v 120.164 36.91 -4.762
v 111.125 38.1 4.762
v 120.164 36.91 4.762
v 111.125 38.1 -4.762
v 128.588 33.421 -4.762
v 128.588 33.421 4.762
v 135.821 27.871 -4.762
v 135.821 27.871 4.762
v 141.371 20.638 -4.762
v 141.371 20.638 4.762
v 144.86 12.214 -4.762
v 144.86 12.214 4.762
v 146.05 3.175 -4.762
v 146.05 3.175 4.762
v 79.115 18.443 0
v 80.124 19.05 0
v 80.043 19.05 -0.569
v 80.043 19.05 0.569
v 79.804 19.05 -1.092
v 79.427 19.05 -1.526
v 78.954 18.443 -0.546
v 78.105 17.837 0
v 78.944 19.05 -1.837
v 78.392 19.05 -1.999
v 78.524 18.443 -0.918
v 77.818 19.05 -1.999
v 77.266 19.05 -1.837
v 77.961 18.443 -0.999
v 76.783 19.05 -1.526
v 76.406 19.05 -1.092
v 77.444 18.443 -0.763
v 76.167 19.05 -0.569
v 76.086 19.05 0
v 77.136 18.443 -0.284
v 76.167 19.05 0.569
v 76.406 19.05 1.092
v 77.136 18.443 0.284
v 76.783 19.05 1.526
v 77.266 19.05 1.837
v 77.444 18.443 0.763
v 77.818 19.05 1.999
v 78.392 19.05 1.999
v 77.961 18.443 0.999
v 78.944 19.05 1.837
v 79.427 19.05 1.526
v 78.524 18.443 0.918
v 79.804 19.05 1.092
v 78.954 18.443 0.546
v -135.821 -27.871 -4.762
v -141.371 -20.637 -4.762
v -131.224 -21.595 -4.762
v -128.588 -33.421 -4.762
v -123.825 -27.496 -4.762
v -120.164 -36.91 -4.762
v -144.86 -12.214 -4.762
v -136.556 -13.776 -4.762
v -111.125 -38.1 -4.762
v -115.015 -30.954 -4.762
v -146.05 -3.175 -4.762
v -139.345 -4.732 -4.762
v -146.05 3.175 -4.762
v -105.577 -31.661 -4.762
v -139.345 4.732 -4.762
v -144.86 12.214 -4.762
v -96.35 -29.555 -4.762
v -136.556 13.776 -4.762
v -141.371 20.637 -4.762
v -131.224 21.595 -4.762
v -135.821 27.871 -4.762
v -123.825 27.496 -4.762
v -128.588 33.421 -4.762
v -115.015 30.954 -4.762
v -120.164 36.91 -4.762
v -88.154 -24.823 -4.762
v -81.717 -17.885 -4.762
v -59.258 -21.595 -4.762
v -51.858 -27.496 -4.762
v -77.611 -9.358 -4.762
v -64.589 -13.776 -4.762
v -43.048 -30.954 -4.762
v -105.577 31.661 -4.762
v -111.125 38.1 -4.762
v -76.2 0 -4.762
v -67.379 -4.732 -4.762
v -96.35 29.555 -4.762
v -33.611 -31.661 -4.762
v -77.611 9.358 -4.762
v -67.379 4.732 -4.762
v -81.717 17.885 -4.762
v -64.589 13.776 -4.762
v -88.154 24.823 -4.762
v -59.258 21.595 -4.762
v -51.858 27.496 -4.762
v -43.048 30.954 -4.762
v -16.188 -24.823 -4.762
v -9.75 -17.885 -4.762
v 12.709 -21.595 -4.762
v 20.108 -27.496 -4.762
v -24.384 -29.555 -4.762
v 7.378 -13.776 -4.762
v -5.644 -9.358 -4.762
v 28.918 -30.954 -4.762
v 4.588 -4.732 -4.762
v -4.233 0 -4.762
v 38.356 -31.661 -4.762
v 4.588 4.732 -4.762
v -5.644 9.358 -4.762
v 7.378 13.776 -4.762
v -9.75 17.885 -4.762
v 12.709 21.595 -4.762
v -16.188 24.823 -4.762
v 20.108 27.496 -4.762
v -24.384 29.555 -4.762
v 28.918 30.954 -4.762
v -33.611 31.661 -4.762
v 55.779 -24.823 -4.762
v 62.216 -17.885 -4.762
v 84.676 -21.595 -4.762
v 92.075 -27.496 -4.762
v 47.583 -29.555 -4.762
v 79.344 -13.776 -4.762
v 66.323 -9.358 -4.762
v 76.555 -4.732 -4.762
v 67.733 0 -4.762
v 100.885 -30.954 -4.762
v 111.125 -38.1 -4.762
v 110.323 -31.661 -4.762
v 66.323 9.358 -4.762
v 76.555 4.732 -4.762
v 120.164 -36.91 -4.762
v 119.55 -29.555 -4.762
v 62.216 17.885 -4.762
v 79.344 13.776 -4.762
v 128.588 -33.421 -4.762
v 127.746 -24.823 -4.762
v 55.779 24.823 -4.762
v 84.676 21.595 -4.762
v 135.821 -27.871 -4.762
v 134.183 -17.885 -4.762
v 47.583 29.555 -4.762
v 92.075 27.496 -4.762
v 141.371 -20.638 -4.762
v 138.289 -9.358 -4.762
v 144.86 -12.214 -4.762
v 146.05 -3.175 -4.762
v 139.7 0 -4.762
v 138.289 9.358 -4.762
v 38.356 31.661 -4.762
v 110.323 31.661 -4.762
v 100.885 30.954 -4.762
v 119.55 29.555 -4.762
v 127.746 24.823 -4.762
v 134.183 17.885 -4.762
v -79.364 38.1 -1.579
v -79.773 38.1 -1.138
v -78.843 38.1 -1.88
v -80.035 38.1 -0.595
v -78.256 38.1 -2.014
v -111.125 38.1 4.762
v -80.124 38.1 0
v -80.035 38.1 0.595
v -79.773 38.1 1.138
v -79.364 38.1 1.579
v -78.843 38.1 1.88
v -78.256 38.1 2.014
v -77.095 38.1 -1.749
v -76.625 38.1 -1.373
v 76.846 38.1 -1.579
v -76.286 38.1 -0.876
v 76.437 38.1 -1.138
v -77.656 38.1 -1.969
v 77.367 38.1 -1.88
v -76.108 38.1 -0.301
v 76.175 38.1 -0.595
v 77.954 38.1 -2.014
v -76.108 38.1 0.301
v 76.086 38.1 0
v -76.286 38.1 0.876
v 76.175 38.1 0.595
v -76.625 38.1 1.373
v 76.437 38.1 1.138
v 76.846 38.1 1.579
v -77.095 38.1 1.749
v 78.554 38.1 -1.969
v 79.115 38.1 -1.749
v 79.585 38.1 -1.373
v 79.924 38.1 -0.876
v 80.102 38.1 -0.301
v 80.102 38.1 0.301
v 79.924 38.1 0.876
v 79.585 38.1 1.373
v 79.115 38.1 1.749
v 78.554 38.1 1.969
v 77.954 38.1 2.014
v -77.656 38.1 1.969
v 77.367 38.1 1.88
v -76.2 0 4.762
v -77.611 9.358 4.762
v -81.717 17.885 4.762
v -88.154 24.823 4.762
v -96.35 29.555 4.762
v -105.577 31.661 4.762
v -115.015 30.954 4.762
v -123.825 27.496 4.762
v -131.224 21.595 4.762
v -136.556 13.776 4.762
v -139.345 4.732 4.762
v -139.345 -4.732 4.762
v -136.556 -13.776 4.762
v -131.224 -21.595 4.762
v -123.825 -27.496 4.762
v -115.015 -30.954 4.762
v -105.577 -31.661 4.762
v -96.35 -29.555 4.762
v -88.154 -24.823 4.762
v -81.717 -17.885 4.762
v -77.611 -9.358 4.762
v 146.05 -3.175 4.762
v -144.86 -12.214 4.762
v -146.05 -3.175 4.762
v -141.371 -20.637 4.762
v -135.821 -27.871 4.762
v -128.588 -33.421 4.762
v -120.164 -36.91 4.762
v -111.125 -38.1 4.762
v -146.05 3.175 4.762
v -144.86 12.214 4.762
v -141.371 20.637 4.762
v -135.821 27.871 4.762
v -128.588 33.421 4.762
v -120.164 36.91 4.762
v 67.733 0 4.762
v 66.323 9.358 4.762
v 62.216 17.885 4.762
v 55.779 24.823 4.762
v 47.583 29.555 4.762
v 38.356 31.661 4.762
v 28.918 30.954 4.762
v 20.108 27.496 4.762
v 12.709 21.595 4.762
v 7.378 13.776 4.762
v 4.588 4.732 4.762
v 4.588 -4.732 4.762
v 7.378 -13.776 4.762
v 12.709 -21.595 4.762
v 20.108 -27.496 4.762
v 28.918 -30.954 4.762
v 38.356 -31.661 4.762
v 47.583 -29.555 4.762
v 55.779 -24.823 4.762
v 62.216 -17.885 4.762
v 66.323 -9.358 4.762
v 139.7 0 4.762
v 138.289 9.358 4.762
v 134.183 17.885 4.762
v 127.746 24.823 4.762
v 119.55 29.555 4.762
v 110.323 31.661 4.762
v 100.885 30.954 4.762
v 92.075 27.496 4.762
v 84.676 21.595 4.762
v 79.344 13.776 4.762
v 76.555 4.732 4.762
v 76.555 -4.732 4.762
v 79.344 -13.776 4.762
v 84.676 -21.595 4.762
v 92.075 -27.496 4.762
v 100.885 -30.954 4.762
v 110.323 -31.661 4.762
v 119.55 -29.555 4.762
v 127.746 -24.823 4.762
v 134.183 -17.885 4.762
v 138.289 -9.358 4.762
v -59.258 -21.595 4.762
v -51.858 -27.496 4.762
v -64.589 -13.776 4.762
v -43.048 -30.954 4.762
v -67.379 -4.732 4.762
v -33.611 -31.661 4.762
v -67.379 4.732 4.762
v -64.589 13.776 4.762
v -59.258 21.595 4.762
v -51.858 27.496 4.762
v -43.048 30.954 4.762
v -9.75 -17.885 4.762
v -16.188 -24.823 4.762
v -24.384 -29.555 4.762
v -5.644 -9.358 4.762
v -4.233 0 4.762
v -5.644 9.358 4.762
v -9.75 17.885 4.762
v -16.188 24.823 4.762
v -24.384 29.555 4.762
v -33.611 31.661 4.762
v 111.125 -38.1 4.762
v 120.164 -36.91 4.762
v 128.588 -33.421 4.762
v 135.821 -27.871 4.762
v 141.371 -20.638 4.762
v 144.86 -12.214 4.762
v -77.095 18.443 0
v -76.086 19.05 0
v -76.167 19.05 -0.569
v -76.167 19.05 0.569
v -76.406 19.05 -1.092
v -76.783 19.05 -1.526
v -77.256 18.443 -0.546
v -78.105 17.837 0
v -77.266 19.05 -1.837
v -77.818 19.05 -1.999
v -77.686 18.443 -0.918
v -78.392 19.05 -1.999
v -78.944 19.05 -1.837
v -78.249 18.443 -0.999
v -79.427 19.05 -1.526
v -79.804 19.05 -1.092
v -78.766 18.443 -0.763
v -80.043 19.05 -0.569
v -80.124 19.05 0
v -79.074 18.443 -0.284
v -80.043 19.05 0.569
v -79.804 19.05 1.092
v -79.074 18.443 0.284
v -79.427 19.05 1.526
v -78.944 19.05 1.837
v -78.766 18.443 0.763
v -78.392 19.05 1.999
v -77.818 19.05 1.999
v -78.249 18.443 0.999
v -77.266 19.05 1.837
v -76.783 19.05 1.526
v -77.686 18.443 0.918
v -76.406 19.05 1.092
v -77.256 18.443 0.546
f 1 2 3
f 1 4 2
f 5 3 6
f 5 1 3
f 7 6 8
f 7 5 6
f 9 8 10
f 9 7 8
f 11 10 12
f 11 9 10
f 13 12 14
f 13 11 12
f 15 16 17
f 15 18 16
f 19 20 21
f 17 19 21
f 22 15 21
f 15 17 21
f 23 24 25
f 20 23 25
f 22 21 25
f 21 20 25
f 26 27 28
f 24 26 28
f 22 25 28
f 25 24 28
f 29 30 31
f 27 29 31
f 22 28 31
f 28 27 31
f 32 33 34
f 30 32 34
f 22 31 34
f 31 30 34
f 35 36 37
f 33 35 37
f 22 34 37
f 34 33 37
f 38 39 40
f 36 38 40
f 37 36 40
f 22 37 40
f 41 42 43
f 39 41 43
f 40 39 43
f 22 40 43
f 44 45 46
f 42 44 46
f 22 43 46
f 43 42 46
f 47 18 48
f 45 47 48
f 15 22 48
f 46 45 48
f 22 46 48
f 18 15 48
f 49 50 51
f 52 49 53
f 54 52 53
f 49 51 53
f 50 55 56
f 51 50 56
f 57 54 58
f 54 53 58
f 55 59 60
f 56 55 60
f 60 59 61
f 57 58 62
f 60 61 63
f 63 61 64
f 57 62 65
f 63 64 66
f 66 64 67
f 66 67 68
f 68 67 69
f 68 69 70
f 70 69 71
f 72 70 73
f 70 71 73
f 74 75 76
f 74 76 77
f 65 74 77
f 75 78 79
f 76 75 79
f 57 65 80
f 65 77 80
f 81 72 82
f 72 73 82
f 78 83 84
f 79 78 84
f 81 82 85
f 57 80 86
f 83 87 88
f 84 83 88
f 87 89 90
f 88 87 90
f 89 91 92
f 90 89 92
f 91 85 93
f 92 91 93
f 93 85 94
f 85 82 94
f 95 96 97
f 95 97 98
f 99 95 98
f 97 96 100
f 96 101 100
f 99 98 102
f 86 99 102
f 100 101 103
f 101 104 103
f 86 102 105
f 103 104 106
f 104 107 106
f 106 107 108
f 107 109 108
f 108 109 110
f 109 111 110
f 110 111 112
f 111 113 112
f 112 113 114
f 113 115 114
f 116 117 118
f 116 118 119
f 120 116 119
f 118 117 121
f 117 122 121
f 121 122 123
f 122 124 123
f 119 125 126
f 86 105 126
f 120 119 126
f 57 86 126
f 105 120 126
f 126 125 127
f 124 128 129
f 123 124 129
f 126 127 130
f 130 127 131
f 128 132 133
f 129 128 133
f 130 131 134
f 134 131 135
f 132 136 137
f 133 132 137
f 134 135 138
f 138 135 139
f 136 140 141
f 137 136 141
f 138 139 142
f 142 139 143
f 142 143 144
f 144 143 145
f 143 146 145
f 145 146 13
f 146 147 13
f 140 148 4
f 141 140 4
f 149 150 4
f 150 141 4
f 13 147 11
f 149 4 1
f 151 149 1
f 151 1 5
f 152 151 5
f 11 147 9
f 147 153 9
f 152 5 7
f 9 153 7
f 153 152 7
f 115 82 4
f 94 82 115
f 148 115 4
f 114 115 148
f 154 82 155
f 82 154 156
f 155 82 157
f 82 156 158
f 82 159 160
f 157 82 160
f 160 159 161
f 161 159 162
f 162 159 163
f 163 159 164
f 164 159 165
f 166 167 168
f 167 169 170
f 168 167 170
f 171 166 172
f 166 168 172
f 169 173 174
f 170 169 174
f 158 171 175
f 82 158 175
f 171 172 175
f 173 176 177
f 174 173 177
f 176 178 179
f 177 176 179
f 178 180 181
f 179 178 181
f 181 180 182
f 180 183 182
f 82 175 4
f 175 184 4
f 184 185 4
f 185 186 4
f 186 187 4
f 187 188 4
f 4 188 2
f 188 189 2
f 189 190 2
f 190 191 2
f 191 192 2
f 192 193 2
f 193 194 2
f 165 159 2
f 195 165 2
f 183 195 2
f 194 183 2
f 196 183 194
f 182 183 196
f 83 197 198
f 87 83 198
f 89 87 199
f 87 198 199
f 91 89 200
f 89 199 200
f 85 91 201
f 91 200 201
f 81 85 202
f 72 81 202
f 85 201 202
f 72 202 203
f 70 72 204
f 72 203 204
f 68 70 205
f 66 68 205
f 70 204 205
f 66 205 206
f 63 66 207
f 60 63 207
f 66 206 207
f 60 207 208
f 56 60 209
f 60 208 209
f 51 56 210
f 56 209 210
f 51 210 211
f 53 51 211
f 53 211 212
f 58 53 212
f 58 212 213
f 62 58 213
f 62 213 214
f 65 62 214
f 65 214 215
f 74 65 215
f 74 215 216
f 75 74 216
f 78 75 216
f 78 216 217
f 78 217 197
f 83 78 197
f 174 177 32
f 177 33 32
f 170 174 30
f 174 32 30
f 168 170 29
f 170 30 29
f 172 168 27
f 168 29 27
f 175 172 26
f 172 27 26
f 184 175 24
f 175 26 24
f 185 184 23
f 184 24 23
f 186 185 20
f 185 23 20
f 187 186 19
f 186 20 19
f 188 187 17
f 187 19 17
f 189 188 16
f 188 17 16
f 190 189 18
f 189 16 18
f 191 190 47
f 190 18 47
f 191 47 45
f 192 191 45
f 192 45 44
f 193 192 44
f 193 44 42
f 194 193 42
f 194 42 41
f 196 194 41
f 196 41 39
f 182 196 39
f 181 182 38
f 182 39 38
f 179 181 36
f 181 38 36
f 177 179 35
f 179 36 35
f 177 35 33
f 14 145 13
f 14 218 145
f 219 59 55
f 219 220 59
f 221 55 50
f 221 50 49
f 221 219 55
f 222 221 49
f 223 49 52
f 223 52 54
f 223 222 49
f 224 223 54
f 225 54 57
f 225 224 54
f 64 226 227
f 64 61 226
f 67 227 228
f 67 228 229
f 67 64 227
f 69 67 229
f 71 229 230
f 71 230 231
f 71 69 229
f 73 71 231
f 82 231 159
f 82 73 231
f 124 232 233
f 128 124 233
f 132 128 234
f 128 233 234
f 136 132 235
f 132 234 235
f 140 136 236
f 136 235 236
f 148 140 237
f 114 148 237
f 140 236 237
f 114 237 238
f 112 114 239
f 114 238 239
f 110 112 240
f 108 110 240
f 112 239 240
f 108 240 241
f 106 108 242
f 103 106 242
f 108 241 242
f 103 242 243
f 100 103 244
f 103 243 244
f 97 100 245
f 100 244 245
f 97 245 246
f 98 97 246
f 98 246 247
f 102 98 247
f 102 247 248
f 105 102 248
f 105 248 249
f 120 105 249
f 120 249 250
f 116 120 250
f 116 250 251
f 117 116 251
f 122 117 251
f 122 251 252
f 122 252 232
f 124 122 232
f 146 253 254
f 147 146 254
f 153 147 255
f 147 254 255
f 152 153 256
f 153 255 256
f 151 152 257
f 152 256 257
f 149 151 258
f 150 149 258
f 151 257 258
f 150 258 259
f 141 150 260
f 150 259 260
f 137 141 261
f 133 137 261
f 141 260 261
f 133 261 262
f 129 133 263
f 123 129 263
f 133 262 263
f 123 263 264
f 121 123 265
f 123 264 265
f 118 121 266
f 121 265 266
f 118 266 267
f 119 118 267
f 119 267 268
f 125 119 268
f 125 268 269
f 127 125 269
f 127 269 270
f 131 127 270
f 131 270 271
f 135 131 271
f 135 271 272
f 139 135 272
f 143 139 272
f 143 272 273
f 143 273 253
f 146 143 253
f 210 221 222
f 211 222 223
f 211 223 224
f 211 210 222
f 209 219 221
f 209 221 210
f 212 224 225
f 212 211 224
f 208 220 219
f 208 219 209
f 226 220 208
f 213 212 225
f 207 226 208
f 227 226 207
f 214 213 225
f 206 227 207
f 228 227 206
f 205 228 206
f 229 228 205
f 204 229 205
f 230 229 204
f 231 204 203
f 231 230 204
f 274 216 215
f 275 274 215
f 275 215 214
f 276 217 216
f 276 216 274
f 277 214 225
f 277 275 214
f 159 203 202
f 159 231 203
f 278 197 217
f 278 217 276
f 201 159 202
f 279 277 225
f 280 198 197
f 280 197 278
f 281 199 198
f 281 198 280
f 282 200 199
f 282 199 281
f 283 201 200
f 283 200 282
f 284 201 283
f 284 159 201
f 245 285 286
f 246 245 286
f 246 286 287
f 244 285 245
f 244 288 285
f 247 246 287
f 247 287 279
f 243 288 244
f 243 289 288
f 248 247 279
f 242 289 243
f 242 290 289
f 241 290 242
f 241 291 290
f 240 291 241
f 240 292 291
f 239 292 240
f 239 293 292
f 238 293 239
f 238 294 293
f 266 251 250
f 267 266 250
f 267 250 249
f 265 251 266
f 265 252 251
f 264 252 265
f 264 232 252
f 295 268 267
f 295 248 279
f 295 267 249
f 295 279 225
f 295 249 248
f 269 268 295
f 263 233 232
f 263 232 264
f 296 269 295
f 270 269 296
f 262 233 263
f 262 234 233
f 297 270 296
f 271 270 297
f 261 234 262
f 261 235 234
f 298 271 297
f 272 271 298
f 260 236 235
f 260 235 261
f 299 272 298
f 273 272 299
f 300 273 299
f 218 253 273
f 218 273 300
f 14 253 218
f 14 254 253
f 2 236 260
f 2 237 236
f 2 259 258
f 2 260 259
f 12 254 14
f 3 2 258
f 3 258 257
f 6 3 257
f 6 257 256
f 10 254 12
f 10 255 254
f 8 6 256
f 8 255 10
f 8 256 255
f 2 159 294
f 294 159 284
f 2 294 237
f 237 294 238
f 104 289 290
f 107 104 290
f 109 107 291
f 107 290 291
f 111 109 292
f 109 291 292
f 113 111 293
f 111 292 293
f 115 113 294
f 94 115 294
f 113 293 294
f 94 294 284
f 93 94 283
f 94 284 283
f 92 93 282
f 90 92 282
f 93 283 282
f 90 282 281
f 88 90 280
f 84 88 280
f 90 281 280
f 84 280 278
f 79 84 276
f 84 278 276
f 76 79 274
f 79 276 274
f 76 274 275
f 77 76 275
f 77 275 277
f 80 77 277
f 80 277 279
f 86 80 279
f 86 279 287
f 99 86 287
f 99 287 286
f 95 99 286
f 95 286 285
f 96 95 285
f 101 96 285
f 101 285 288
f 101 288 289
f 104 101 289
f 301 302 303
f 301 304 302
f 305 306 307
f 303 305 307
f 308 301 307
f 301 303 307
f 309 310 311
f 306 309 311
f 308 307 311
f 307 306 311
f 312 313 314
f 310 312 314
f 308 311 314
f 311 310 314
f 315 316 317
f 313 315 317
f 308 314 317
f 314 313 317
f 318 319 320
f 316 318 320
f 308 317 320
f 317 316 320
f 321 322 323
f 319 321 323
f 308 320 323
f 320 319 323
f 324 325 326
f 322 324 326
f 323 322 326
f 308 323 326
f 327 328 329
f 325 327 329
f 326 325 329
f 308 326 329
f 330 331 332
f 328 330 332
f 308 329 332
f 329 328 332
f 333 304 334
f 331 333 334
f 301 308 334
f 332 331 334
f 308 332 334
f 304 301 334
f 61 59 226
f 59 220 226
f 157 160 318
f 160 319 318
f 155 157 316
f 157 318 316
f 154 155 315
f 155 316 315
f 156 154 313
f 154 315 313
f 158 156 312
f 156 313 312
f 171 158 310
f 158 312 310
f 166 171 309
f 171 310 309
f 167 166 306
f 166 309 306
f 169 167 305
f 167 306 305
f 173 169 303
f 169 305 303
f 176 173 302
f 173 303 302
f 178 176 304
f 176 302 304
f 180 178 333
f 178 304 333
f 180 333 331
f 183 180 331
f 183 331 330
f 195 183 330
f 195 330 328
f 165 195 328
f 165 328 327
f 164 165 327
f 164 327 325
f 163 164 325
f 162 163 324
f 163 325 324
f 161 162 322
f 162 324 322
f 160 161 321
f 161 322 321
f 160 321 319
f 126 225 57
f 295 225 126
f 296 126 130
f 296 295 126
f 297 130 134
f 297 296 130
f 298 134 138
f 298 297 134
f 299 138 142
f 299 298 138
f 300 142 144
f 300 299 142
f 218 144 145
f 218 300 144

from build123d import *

# Parameters (mm, degrees)
SKETCH1_W                  = 292.1
SKETCH1_H                  = 76.2
BOSS_EXTRUDE1_DEPTH        = 4.7625
SKETCH2_R                  = 31.75
CUT_EXTRUDE1_DEPTH         = 152.23801812
FILLET1_R                  = 34.925
F_10_32_TAPPED_HOLE2_D     = 4.0386
F_10_32_TAPPED_HOLE2_DEPTH = 19.05
F_10_32_TAPPED_HOLE2_TIP   = 1.213317848


with BuildPart() as part:
    # Sketch1 → Boss-Extrude1 (new, symmetric)
    with BuildSketch(Plane.XY):
        Rectangle(SKETCH1_W, SKETCH1_H)
    extrude(amount=BOSS_EXTRUDE1_DEPTH, both=True)

    # Sketch2 → Cut-Extrude1 (cut, through all)
    with BuildSketch(Plane.XY.offset(4.7625)):
        with Locations((-107.95, 0)):
            Circle(SKETCH2_R)
        with Locations((-35.983333333, 0)):
            Circle(SKETCH2_R)
        with Locations((35.983333333, 0)):
            Circle(SKETCH2_R)
        with Locations((107.95, 0)):
            Circle(SKETCH2_R)
    extrude(amount=-CUT_EXTRUDE1_DEPTH, mode=Mode.SUBTRACT)

    # Fillet1
    fillet1_edges = [part.edges().sort_by_distance(p)[0] for p in [
        (-146.05, 38.1, 0),
        (146.05, 38.1, 0),
        (146.05, -38.1, 0),
        (-146.05, -38.1, 0),
    ]]
    fillet(fillet1_edges, radius=FILLET1_R)

    # #10-32 Tapped Hole2
    with Locations(Plane(origin=(0, 38.1, 0), x_dir=(1, 0, 0), z_dir=(0, 1, 0))):
        with Locations((-78.105, 0), (78.105, 0)):
            Hole(F_10_32_TAPPED_HOLE2_D / 2, depth=F_10_32_TAPPED_HOLE2_DEPTH)
            with Locations((0, 0, -(F_10_32_TAPPED_HOLE2_DEPTH + F_10_32_TAPPED_HOLE2_TIP / 2))):  # 118° drill point
                Cone(0, F_10_32_TAPPED_HOLE2_D / 2, F_10_32_TAPPED_HOLE2_TIP, mode=Mode.SUBTRACT)


solid = part.part
